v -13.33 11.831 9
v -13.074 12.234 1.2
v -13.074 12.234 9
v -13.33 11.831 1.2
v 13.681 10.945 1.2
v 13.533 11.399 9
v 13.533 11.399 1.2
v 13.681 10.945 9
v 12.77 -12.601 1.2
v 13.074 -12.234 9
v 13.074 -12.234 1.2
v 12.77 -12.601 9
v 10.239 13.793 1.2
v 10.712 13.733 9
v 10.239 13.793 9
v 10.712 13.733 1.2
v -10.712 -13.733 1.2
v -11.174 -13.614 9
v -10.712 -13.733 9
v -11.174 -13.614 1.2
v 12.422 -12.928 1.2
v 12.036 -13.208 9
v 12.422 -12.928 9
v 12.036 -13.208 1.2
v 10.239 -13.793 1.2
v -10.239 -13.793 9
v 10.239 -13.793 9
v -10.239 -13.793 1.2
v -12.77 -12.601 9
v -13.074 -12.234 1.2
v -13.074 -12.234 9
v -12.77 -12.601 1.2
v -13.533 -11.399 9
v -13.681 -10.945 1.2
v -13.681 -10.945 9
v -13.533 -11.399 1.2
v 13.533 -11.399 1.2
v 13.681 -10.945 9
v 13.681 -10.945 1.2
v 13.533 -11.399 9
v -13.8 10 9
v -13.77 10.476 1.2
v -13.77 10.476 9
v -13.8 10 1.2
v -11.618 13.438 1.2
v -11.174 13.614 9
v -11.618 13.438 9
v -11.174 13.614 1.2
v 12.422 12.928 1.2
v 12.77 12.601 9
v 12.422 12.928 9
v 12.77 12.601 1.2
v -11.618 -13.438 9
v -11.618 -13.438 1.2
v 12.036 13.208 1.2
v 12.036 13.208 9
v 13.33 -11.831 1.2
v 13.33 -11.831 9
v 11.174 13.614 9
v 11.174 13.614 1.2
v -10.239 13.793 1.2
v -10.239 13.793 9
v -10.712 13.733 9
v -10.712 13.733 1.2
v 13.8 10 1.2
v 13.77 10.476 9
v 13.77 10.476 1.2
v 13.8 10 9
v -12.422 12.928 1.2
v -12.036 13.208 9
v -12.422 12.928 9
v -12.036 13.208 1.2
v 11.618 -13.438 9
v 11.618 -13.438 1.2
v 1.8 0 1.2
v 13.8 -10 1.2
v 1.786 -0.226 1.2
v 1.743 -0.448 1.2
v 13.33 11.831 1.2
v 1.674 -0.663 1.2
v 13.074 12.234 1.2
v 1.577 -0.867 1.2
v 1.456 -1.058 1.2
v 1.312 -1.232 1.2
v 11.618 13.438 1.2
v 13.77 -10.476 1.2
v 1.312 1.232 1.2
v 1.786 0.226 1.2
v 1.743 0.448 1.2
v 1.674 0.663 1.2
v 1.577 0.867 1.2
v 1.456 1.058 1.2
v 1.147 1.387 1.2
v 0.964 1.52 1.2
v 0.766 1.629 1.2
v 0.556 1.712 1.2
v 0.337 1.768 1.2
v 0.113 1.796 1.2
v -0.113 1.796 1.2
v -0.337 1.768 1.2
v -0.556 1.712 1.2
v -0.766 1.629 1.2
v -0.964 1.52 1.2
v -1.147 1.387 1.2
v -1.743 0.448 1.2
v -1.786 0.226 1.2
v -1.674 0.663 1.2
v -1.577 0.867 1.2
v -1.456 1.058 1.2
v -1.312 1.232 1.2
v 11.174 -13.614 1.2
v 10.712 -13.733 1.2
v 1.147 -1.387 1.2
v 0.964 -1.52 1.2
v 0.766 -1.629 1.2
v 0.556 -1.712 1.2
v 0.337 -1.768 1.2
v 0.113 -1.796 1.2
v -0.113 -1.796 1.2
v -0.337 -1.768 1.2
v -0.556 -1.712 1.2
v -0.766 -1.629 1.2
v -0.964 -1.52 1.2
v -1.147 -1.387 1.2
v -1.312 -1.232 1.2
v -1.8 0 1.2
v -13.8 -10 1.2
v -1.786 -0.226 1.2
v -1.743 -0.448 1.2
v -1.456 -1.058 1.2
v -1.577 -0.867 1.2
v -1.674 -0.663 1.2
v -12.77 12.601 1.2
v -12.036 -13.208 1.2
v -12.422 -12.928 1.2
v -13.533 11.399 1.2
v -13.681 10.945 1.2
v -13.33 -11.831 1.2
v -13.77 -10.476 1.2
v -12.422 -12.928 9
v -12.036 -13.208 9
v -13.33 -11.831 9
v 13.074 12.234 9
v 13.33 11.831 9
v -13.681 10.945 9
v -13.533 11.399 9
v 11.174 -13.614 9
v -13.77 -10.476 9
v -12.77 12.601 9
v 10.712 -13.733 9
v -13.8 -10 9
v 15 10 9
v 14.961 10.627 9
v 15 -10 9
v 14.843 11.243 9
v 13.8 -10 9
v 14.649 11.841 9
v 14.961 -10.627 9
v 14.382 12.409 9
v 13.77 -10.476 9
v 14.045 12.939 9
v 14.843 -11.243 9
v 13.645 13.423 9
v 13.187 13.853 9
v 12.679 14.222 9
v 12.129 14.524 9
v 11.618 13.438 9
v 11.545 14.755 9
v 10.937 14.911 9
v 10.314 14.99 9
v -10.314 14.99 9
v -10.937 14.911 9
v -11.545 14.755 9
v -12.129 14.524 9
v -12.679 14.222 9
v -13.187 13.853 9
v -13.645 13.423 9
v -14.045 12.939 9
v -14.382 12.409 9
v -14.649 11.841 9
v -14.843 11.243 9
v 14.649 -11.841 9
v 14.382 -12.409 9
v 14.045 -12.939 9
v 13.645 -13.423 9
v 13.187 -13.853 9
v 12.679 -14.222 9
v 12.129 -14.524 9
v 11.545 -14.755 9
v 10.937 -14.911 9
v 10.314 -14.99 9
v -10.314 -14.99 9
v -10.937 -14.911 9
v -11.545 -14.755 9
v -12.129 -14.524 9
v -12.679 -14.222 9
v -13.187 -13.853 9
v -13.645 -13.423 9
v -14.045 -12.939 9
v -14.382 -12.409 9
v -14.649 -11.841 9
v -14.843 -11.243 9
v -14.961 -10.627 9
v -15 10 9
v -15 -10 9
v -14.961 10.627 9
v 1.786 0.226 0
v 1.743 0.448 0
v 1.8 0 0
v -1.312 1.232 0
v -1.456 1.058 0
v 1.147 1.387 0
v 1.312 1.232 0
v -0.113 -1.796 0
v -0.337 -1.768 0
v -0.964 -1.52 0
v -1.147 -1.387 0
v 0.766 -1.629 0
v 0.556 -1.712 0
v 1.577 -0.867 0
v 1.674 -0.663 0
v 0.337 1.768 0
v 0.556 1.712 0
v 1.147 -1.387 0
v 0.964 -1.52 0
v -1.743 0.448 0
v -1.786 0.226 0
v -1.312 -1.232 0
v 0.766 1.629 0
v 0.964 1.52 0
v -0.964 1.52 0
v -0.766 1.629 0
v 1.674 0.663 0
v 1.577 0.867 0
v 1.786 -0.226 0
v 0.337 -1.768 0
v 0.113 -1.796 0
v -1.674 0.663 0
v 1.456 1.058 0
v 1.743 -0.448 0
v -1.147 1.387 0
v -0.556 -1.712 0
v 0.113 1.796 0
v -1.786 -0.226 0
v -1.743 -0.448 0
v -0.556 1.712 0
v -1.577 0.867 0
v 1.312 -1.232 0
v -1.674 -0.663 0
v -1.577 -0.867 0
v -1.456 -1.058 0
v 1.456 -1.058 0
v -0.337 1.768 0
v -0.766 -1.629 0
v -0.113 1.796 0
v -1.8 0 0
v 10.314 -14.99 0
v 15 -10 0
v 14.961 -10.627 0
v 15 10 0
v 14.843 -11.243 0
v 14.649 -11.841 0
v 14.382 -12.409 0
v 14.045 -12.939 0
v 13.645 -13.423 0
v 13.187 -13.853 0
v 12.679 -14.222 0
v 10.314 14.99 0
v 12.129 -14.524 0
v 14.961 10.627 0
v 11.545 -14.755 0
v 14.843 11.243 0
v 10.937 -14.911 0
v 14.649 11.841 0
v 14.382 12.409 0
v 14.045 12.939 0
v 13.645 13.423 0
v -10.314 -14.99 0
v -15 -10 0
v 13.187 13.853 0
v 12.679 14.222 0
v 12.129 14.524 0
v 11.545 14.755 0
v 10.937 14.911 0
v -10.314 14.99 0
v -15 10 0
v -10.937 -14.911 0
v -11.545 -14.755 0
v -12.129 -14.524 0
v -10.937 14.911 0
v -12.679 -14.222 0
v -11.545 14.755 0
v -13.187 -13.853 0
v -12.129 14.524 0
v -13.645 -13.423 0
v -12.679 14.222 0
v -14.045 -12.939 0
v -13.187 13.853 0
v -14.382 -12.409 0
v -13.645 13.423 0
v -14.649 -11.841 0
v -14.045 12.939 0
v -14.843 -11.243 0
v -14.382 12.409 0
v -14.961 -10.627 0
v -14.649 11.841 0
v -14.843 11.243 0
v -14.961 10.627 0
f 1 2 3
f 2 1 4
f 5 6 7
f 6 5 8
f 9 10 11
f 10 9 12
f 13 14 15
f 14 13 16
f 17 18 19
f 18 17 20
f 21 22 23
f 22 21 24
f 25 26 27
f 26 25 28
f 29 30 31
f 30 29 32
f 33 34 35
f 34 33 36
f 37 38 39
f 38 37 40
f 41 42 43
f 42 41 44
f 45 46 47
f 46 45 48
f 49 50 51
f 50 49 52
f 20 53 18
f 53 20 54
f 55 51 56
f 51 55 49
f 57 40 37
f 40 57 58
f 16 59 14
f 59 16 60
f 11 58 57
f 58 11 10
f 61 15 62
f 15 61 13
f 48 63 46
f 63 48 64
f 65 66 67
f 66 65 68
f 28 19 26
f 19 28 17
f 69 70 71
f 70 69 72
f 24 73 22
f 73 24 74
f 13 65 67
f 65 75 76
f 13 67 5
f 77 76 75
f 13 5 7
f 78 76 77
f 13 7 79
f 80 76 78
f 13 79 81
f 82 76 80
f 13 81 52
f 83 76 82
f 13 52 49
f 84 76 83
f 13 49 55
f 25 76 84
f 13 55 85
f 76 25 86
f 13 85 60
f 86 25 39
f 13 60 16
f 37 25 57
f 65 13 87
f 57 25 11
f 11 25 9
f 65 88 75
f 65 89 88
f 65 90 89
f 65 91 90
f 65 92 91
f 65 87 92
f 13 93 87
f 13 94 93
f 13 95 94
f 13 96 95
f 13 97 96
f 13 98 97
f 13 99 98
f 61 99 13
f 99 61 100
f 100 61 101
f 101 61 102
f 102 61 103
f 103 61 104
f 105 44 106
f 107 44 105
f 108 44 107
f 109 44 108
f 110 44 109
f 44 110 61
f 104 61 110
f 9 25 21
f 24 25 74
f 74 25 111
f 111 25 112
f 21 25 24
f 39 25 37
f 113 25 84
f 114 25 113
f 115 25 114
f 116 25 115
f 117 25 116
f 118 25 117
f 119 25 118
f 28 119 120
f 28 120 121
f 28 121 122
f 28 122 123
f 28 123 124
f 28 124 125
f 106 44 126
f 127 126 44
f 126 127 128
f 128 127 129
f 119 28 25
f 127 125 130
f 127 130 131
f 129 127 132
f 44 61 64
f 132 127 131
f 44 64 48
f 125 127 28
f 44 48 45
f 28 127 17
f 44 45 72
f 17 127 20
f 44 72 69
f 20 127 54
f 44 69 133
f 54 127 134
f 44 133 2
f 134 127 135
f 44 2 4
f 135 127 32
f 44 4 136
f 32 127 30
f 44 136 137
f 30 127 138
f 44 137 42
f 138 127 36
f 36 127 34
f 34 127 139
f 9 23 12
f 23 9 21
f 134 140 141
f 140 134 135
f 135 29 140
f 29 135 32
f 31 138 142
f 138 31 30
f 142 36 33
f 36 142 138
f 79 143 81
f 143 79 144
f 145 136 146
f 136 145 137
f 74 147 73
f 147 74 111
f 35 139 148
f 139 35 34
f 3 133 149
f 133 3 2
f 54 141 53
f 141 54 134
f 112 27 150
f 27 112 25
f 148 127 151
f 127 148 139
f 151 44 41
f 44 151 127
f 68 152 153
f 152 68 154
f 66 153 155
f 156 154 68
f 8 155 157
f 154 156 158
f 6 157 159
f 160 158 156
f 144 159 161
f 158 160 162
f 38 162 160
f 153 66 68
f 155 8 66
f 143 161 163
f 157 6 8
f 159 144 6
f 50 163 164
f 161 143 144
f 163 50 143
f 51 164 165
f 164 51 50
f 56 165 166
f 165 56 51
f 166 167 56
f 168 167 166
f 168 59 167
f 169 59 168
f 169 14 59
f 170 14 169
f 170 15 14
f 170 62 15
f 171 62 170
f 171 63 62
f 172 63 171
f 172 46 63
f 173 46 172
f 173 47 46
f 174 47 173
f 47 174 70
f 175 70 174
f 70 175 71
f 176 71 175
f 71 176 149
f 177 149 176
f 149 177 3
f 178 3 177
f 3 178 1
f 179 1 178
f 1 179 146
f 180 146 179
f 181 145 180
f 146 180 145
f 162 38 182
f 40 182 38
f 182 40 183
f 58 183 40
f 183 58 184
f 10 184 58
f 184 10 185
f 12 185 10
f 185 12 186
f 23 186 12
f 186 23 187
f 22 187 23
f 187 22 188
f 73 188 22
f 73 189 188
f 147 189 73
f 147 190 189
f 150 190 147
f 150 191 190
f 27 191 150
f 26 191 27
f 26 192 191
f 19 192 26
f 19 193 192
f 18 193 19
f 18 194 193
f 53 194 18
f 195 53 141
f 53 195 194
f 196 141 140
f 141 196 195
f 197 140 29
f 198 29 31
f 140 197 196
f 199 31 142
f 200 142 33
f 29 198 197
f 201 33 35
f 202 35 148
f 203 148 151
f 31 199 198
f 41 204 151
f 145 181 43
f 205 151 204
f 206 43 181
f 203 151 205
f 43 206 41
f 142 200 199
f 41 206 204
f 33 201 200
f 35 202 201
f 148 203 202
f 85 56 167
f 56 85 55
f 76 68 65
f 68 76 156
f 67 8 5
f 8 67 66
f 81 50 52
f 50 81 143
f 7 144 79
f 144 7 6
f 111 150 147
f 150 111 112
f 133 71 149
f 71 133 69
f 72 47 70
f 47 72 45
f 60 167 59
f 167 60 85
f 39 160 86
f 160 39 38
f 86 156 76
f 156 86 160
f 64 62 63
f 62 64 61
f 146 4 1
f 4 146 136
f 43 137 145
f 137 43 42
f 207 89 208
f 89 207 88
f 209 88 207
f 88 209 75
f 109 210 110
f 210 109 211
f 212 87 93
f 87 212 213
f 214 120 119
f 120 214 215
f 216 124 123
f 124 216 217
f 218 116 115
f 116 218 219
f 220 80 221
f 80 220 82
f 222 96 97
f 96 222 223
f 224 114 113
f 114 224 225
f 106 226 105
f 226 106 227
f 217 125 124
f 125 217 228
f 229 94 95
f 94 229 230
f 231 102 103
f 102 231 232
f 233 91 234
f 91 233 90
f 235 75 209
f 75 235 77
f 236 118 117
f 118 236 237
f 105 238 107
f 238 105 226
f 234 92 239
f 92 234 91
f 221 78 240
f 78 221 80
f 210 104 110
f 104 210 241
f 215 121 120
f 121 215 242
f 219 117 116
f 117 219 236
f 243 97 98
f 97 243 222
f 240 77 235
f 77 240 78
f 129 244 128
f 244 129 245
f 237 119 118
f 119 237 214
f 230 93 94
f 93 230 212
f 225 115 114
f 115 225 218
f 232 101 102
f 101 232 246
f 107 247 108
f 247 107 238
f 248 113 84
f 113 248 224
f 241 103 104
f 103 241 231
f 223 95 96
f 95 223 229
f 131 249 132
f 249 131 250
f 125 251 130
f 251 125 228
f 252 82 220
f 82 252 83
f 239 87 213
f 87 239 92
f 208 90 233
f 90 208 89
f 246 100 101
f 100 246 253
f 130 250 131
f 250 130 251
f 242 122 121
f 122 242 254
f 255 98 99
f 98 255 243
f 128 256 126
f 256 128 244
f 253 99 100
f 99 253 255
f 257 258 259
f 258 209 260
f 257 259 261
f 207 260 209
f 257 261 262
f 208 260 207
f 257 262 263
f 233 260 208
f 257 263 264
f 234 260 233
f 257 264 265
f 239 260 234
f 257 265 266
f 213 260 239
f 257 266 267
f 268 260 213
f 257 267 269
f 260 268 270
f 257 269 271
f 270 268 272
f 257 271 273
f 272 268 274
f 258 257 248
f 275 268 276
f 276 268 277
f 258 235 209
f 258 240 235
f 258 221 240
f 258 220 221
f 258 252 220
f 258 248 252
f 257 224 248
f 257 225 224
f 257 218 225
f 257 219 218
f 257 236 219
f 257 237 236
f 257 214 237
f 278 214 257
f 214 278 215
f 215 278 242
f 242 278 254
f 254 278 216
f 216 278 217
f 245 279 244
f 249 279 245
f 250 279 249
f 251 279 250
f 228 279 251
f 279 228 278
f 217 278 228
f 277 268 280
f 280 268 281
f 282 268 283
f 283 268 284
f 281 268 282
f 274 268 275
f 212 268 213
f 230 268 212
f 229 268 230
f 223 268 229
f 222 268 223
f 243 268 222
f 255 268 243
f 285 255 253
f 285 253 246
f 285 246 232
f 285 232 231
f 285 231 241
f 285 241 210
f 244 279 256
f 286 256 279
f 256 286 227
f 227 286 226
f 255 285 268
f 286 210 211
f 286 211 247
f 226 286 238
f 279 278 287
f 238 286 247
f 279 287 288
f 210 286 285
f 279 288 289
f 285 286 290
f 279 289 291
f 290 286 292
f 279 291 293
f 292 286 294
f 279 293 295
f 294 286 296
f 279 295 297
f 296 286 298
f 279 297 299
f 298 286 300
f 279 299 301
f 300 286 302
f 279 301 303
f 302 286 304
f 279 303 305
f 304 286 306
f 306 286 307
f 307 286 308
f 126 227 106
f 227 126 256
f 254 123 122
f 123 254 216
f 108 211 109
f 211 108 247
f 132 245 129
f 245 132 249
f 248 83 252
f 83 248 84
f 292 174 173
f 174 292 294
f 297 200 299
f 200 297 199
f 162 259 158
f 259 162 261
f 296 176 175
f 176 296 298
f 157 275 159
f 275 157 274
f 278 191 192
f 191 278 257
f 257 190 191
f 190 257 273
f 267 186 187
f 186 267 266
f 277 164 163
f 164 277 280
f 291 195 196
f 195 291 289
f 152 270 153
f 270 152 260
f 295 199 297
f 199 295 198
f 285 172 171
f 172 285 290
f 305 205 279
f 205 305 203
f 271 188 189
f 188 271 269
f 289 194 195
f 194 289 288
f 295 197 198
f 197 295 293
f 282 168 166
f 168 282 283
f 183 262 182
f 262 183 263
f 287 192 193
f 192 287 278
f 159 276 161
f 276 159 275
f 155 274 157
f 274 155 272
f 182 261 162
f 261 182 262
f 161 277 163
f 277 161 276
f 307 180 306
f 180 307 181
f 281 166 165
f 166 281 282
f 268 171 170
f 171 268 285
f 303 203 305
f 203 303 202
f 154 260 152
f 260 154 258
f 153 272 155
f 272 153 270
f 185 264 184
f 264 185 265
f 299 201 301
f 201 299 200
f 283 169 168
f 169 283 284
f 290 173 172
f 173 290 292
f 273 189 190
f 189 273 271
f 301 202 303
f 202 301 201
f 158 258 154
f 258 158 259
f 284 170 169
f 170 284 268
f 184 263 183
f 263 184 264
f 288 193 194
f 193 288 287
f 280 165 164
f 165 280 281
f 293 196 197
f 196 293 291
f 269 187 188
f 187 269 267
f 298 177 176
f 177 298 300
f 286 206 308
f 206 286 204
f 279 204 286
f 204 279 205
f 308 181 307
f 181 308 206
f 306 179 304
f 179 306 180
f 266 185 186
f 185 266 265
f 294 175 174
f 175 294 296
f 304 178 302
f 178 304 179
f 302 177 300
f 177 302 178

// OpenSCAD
$fn = 50;


difference() {
	union() {
		hull() {
			translate(v = [-10.0000000000, 10.0000000000, 0]) {
				cylinder(h = 9, r = 5);
			}
			translate(v = [10.0000000000, 10.0000000000, 0]) {
				cylinder(h = 9, r = 5);
			}
			translate(v = [-10.0000000000, -10.0000000000, 0]) {
				cylinder(h = 9, r = 5);
			}
			translate(v = [10.0000000000, -10.0000000000, 0]) {
				cylinder(h = 9, r = 5);
			}
		}
	}
	union() {
		translate(v = [0, 0, 1.2000000000]) {
			hull() {
				translate(v = [-10.0000000000, 10.0000000000, 0]) {
					cylinder(h = 7.8000000000, r = 3.8000000000);
				}
				translate(v = [10.0000000000, 10.0000000000, 0]) {
					cylinder(h = 7.8000000000, r = 3.8000000000);
				}
				translate(v = [-10.0000000000, -10.0000000000, 0]) {
					cylinder(h = 7.8000000000, r = 3.8000000000);
				}
				translate(v = [10.0000000000, -10.0000000000, 0]) {
					cylinder(h = 7.8000000000, r = 3.8000000000);
				}
			}
		}
		#cylinder(h = 1.2000000000, r = 1.8000000000);
	}
}
